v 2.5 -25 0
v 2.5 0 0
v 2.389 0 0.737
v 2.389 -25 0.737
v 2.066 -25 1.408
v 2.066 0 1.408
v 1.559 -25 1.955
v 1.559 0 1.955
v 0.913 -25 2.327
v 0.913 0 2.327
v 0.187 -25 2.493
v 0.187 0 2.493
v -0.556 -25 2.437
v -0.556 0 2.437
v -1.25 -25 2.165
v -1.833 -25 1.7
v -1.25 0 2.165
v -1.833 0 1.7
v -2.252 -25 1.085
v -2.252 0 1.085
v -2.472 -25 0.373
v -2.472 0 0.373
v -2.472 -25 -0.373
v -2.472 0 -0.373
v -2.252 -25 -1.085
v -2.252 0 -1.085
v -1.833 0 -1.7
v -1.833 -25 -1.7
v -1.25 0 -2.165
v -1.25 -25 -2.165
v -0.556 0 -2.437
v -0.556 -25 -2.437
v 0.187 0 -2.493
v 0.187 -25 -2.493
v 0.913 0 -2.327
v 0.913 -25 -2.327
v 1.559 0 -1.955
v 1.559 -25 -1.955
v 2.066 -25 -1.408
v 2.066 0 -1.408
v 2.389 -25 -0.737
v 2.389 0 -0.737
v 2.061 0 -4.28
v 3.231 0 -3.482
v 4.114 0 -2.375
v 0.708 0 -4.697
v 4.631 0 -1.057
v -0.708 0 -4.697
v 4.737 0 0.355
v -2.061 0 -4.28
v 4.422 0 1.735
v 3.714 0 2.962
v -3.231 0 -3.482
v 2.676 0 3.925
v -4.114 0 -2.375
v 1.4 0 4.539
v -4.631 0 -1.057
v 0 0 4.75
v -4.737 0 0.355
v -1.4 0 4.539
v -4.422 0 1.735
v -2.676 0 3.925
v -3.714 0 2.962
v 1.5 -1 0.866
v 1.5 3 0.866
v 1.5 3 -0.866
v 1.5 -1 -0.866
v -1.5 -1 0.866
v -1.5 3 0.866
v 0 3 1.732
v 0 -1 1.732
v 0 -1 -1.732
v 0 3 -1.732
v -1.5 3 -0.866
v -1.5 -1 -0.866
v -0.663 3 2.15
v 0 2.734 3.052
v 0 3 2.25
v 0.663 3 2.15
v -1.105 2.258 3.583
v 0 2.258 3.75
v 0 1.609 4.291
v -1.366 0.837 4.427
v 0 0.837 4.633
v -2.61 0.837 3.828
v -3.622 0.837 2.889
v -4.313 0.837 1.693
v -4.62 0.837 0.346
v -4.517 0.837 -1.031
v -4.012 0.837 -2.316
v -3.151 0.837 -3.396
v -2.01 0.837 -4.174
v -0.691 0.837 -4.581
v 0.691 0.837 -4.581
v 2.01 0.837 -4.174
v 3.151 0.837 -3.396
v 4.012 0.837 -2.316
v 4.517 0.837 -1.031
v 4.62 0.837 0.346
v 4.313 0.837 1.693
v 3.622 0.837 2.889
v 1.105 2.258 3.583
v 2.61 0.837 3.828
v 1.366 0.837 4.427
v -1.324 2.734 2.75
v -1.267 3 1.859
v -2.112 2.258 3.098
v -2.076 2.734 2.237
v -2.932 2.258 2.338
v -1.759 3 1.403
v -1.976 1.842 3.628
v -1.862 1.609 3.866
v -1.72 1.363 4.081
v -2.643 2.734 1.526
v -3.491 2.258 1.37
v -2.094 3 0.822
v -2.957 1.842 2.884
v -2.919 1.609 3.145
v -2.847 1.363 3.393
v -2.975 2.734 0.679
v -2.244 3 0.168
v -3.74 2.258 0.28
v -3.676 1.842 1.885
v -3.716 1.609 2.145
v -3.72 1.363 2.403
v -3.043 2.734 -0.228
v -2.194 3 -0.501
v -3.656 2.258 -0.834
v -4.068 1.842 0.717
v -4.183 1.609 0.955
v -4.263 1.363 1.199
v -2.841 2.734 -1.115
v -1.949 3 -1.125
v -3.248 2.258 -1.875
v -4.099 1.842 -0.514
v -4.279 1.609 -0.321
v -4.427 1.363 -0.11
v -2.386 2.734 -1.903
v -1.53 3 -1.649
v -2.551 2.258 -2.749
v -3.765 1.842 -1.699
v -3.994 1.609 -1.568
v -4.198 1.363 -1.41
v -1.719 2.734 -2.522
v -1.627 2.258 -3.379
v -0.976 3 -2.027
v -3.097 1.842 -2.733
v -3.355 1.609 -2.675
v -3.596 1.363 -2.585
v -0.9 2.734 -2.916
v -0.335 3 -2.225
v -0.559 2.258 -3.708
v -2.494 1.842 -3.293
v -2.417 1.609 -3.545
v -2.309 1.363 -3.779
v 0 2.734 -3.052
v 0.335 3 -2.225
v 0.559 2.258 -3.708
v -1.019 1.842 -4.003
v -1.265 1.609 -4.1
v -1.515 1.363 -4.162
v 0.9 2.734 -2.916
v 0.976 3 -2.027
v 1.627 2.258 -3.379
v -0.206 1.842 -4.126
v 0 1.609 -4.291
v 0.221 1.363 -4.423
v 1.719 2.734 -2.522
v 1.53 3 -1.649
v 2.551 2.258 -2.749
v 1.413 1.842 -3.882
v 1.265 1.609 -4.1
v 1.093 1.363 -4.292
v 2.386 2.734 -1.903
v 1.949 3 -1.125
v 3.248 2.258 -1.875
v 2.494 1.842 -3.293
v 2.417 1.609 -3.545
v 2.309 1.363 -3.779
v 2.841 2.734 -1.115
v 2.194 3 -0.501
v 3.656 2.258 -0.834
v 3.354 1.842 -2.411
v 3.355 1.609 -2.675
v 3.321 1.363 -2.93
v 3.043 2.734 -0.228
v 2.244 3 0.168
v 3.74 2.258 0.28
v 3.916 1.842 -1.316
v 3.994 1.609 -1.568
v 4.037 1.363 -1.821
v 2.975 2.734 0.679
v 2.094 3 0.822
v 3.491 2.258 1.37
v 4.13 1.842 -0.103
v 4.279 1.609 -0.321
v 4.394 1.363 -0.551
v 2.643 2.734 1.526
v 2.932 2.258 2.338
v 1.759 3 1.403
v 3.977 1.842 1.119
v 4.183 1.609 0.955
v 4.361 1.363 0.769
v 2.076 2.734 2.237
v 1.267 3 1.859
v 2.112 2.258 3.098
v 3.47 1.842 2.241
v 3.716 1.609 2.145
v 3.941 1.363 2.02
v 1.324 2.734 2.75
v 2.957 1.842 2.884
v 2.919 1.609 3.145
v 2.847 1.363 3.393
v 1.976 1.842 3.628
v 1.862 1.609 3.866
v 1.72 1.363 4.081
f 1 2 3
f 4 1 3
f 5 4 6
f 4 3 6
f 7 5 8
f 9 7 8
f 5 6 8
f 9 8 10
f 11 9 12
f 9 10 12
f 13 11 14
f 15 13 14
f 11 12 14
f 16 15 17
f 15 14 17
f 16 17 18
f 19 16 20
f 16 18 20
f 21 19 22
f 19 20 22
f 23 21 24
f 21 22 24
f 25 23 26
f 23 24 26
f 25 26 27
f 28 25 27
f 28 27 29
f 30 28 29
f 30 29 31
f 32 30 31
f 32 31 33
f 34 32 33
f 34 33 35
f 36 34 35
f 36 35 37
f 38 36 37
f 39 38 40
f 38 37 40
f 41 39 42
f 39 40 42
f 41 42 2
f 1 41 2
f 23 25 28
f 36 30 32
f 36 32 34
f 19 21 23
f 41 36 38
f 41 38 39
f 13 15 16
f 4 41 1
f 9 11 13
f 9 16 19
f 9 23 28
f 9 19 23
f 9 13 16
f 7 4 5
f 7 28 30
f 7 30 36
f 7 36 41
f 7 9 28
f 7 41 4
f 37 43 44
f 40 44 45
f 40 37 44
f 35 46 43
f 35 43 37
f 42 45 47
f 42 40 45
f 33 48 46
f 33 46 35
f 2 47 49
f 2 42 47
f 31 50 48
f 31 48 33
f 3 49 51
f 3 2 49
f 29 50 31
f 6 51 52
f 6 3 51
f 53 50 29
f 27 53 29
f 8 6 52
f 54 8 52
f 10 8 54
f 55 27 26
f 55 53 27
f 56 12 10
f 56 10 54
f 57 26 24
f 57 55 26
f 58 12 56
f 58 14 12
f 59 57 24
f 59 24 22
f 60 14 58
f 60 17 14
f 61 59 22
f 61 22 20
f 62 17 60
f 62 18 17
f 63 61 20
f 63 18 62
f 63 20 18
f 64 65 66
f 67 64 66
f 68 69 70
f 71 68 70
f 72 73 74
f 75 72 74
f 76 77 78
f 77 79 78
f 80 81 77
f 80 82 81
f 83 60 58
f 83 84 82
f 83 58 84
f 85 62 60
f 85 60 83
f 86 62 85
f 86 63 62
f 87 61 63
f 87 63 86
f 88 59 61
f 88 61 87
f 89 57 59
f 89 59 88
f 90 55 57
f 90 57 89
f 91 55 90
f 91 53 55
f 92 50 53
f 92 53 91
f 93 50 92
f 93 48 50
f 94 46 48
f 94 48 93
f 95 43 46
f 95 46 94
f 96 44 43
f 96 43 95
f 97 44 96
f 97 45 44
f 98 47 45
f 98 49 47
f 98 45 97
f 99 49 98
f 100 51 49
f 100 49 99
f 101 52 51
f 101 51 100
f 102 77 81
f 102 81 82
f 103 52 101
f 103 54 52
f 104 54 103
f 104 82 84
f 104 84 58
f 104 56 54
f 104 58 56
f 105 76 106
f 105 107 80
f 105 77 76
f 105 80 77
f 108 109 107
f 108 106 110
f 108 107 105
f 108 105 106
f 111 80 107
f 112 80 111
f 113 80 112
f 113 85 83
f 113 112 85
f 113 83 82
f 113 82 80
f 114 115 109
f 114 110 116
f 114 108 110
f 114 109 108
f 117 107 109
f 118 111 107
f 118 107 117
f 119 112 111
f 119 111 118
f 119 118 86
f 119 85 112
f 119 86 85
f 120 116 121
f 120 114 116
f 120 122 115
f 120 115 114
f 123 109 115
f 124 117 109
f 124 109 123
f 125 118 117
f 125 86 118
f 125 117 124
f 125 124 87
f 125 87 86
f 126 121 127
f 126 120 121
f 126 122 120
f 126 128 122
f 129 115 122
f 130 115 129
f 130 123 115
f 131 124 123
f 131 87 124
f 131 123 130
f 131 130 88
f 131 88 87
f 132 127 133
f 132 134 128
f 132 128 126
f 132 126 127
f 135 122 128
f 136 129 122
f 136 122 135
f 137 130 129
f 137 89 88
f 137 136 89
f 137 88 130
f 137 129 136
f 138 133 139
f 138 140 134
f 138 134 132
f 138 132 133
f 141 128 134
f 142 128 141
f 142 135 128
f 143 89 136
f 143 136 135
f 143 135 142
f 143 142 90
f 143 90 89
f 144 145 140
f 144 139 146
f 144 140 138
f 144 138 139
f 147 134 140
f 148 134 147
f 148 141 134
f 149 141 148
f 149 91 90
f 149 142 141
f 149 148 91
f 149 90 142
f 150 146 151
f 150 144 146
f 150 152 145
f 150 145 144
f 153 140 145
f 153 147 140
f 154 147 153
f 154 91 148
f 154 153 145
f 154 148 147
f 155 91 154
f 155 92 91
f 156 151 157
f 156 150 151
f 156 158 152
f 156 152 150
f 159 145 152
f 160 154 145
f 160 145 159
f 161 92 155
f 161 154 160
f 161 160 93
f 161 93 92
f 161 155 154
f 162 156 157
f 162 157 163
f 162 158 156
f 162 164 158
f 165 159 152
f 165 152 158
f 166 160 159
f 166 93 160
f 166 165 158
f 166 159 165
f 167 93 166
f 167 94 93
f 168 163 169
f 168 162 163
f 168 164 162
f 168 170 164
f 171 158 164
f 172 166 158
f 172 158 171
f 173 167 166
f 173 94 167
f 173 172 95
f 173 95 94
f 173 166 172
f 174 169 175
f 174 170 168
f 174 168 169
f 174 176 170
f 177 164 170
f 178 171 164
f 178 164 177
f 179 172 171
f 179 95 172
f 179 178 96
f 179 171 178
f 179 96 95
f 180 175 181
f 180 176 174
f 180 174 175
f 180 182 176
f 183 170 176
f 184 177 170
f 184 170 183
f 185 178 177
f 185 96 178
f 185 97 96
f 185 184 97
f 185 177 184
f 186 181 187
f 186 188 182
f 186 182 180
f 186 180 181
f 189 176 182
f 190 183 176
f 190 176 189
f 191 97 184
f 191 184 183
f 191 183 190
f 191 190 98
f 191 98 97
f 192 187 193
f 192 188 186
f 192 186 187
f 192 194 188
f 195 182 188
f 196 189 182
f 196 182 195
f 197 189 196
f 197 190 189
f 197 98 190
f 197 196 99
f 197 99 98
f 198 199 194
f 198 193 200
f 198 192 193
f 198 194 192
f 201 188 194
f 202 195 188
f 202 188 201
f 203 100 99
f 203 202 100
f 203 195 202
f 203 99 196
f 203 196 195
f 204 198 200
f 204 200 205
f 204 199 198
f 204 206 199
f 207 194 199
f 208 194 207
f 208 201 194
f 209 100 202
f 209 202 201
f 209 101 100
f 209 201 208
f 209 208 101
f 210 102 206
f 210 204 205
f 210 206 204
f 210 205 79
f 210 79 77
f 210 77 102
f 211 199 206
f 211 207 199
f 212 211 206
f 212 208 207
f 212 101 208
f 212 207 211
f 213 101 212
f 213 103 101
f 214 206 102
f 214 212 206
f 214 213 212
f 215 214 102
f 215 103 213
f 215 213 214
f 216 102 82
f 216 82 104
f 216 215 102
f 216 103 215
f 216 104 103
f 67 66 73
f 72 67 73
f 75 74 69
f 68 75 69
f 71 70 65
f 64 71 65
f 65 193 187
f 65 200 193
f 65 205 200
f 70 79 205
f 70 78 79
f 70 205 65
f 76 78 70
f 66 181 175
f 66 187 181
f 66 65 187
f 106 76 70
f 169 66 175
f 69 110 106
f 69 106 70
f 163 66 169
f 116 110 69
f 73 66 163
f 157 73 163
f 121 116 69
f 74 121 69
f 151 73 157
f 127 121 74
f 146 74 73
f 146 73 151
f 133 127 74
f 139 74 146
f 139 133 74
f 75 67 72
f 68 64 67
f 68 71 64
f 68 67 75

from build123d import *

# Parameters (mm, degrees)
F1_R     = 2.5
F2_DEPTH = 25
F6_DEPTH = 4


with BuildPart() as f2:
    # F1 (on Front) → F2 (new body)
    with BuildSketch(Plane.XZ):
        Circle(F1_R)
    extrude(amount=F2_DEPTH)

    # F3 (on Right) → F4 (revolve)
    with BuildSketch(Plane.YZ):
        with BuildLine():
            Line((0, 4.75), (0, 0))
            Line((0, 0), (3, 0))
            Line((3, 0), (3, 1.5))
            Line((3, 1.5), (3, 2.25))
            ThreePointArc((3, 2.25), (1.952562419, 4.0430749028), (0, 4.75))
        make_face()
    revolve(axis=Axis((0, 0, 0), (0, -1, 0)))

    # F5 (on face) → F6 (cut)
    with BuildSketch(Plane(origin=(0, 3, 0), x_dir=(-1, 0, 0), z_dir=(0, 1, 0))):
        Polygon((-1.5, 0.8660254038), (-1.5, -0.8660254038), (0, -1.7320508076), (1.5, -0.8660254038), (1.5, 0.8660254038), (0, 1.7320508076), align=None)
    extrude(amount=-F6_DEPTH, mode=Mode.SUBTRACT)


solid = f2.part
